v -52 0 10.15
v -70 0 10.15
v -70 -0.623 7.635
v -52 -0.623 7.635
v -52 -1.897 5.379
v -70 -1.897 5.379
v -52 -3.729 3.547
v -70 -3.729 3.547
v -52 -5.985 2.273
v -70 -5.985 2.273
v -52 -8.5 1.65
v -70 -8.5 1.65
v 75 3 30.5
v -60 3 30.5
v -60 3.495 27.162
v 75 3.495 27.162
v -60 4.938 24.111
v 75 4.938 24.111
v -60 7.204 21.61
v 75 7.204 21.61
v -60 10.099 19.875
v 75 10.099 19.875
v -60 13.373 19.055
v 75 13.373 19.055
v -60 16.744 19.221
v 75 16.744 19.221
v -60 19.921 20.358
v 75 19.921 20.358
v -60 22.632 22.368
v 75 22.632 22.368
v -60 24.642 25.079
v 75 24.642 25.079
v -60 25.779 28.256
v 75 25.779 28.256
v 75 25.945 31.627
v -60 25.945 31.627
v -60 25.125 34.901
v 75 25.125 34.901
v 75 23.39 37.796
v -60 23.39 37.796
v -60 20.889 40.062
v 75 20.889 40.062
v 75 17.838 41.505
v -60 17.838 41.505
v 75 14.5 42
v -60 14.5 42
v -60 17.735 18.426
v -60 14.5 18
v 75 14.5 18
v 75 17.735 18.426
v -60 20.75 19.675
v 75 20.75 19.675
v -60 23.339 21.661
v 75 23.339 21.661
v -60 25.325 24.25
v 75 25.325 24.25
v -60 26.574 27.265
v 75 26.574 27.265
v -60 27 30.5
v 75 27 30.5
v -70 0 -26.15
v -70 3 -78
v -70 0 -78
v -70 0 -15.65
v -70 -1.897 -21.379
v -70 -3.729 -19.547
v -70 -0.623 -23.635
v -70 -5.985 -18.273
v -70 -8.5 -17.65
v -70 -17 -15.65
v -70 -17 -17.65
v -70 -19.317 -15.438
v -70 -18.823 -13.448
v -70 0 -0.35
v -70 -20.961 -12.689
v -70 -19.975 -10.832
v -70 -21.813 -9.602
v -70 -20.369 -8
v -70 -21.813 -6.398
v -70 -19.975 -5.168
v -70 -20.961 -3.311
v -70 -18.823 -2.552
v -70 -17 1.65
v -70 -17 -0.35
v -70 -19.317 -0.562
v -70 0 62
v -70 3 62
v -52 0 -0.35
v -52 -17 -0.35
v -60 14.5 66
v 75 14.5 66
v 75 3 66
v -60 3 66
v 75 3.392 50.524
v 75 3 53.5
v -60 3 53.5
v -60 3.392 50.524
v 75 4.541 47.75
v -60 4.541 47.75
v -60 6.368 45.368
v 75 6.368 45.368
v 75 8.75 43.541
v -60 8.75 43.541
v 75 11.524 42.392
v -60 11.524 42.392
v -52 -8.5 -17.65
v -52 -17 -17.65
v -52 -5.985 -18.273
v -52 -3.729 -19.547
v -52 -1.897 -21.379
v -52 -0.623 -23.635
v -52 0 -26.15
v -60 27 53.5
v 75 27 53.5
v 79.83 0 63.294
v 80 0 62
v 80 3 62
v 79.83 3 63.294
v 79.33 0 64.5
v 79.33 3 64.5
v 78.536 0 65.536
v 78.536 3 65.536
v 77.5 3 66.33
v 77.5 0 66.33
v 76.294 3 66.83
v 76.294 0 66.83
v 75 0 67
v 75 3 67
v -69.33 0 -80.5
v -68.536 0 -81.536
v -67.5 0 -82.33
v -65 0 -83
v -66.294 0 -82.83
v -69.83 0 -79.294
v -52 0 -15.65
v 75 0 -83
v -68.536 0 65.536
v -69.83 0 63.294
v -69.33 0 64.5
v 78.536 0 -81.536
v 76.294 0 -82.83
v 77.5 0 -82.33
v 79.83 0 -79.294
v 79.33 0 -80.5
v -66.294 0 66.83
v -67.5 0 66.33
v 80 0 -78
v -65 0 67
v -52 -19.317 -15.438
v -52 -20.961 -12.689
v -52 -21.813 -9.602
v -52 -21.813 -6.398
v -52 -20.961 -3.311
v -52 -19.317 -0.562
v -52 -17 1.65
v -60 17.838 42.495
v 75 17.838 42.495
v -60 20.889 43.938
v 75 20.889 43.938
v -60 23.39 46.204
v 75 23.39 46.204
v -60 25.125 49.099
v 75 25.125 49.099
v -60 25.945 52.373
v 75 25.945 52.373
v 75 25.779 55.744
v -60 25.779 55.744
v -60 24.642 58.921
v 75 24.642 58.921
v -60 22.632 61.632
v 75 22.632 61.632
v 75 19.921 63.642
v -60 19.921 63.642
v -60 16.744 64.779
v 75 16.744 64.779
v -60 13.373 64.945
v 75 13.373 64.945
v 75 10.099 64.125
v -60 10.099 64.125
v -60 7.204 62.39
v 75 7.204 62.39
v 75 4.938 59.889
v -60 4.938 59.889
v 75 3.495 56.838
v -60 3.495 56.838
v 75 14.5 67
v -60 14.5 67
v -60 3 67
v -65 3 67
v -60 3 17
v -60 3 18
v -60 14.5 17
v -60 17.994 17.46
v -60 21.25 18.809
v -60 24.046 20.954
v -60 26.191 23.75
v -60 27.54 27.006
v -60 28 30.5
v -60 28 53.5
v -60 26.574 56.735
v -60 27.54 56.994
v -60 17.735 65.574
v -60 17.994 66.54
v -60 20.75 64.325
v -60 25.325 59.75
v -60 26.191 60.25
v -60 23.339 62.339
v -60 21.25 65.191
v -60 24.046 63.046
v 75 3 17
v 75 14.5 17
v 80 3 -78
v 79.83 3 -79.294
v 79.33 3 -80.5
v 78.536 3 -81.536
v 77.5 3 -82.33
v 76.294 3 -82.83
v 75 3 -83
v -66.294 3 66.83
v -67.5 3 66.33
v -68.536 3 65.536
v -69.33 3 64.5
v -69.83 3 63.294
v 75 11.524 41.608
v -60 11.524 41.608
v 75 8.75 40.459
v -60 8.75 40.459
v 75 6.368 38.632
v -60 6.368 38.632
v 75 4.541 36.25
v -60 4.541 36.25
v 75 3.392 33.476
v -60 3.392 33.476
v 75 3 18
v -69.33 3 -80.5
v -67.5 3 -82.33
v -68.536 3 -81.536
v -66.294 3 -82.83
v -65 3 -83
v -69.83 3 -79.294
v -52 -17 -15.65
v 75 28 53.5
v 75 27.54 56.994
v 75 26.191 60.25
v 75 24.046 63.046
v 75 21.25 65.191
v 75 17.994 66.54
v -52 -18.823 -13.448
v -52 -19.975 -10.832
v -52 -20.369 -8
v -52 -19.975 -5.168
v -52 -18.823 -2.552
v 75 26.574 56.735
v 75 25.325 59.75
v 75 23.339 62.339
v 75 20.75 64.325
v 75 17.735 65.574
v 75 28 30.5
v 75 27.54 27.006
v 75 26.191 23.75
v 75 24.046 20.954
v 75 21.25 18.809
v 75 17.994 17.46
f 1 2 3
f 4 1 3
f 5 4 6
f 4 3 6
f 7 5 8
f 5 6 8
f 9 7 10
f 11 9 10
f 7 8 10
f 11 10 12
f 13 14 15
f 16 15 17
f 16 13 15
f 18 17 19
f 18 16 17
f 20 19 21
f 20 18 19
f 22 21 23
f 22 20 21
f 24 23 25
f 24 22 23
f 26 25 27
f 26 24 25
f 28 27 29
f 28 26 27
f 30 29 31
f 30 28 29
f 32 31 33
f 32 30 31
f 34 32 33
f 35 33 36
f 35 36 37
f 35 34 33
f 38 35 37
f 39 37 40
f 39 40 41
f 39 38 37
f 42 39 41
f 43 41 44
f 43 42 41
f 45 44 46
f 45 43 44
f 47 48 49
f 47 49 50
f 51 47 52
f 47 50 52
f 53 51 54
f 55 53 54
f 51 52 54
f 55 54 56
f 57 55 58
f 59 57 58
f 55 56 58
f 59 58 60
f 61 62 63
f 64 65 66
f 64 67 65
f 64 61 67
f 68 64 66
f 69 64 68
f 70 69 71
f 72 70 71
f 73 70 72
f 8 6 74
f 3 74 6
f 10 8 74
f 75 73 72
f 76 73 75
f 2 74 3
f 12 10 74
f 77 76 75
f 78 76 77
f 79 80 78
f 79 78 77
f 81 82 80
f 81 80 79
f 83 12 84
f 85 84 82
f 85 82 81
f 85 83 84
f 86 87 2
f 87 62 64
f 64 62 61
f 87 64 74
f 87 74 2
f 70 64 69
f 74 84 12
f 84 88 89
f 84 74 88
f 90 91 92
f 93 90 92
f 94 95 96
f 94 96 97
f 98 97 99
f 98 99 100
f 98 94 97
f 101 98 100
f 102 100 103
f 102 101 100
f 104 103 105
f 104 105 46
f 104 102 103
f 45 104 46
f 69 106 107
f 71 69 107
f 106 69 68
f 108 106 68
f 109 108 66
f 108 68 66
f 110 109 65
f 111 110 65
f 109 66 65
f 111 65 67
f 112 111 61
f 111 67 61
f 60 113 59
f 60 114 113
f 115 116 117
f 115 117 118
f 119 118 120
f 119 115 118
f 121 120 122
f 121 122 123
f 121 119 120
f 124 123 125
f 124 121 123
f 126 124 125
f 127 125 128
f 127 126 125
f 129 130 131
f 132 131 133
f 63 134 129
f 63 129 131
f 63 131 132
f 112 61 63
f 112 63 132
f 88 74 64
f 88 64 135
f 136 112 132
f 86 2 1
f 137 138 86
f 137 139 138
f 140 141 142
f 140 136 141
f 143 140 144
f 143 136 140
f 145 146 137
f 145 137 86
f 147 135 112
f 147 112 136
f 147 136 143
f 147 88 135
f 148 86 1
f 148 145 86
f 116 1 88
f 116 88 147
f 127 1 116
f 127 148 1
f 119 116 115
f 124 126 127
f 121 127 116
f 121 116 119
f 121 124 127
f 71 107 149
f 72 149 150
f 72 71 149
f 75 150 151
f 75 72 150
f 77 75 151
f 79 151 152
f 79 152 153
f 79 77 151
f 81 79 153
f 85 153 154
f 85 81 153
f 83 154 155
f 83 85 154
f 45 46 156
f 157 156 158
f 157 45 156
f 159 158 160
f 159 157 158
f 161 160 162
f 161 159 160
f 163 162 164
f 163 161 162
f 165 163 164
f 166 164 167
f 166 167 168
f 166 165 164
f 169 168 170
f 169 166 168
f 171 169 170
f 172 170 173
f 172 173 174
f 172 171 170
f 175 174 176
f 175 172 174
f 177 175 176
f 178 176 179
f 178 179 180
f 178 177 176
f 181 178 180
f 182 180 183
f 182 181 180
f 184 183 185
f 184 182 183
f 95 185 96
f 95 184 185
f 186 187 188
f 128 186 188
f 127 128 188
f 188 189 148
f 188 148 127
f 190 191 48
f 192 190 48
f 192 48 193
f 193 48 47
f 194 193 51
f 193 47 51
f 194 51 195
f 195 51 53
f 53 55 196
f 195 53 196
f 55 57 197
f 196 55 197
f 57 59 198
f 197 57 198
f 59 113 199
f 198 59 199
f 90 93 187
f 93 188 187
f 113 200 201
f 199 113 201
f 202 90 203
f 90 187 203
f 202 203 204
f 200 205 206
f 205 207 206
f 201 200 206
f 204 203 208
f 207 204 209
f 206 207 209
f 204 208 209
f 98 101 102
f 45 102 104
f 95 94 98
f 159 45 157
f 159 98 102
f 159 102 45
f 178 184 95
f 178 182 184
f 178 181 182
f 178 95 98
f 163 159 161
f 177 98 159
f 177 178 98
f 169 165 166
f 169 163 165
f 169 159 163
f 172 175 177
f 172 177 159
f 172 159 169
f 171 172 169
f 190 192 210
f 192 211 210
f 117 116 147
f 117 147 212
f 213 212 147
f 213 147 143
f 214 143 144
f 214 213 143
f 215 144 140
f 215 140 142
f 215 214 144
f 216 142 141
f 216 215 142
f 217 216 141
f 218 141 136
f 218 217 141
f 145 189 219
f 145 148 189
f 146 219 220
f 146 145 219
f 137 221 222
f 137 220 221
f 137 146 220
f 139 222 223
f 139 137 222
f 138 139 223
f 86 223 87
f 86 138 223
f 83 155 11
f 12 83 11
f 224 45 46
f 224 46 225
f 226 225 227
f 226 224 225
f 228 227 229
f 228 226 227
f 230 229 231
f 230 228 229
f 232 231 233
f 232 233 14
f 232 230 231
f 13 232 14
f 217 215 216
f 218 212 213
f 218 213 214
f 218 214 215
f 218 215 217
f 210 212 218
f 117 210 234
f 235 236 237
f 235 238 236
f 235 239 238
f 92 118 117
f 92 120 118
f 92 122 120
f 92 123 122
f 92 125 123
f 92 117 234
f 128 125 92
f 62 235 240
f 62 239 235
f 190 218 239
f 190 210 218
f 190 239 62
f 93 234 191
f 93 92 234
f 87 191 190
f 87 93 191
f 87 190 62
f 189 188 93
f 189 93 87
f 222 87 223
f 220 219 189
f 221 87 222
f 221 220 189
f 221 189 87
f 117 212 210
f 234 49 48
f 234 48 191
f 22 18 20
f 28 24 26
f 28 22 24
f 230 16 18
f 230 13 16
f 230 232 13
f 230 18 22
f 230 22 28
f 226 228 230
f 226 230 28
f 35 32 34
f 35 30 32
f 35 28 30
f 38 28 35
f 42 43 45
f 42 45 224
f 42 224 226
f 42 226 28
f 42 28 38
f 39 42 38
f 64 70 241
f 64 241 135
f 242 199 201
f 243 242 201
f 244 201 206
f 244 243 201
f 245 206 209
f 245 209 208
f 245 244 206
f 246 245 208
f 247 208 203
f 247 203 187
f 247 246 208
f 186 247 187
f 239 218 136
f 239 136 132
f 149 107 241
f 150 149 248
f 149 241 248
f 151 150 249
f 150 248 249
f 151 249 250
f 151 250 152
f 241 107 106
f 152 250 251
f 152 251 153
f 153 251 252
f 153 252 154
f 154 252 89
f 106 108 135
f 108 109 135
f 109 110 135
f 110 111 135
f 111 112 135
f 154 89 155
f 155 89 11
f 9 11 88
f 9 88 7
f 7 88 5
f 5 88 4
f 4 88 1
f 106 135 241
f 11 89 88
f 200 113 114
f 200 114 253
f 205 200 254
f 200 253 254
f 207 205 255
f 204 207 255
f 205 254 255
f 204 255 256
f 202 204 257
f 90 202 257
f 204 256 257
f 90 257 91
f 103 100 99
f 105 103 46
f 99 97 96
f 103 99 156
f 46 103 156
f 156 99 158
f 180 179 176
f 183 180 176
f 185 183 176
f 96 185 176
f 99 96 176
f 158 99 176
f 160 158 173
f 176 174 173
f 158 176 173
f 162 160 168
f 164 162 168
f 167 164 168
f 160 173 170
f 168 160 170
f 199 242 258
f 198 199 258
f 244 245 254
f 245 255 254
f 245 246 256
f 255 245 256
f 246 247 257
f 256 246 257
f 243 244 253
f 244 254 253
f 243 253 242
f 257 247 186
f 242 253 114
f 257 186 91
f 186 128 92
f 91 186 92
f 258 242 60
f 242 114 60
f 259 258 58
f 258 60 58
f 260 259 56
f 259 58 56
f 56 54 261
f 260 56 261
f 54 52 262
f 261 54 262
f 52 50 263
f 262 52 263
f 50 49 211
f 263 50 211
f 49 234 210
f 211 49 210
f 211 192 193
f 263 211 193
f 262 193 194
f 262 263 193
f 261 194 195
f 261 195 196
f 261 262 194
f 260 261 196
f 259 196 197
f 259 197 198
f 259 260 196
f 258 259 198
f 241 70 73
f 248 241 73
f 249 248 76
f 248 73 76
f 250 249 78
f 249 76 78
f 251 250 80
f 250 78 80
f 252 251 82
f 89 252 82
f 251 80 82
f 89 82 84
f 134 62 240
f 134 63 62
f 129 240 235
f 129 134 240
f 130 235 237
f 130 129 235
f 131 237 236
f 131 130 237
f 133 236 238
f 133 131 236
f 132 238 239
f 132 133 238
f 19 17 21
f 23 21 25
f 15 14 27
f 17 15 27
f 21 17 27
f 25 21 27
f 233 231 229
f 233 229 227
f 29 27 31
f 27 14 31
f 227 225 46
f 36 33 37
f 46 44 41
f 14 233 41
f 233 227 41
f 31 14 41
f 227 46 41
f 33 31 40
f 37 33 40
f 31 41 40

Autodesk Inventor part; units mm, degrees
sketch "Sketch1" plane through (0, 0, 0) normal (0, 1, 0) x (-1, 0, 0)
  line L0 (0, 0) -> (75, 0)
  line L1 (0, 0) -> (-75, 0)
  line L2 (75, 0) -> (75, 75)
  line L3 (75, 75) -> (-75, 75)
  line L4 (-75, 75) -> (-75, 0)
  line L5 (-75, 0) -> (-75, -75)
  line L6 (-75, -75) -> (75, -75)
  line L7 (75, -69.5548) -> (75, 0)
  line L8 (75, -75) -> (75, -69.5548)
  line L9 (-75, 75) -> (-75, 65)
  dimension "d4" = 10
extrude "Extrusion1" add sketch "Sketch1" along normal blind 3
ref_plane "Work Plane1" through (75, 0, 0) normal (1, 0, 0) x (0, 1, 0)
sketch "Sketch3" plane through (75, 0, 0) normal (1, 0, 0) x (0, 1, 0)
  line L0 (3, 75) -> (3, 65)
  line L1 (3, 75) -> (3, -75) projected
  line L2 (3, 65) -> (3, 53.5)
  line L3 (3, 53.5) -> (14.5, 53.5)
  circle A0 centre (14.5, 53.5) radius 11.5
  line L4 (3, 53.5) -> (3, 30.5)
  line L5 (3, 30.5) -> (14.5, 30.5)
  circle A1 centre (14.5, 30.5) radius 11.5
  point P0 (0, 0)
  dimension "d12" = 10
  dimension "d13" = 11.5
  dimension "d14" = 11.5
  dimension "d15" = 23
extrude "Extrusion2" add sketch "Sketch3" against normal blind 135 contours A0 | A1
sketch "Sketch4" plane through (0, 3, 0) normal (0, 1, 0) x (1, 0, 0)
  point P0 (0, 0)
sketch "Sketch5" plane through (0, 3, 0) normal (0, 1, 0) x (1, 0, 0)
  point P0 (0, 0)
sketch "Sketch6" plane through (75, 0, 0) normal (1, 0, 0) x (0, 1, 0)
  arc A0 (14.5, 42) -> (3, 53.5) centre (14.5, 53.5) ccw projected
  line L0 (3, 75) -> (3, 53.5) projected
  arc A1 (3, 30.5) -> (14.5, 42) centre (14.5, 30.5) ccw projected
  line L1 (3, 30.5) -> (3, -75) projected
  line L2 (14.5, 66) -> (3, 66)
  line L3 (14.5, 18) -> (3, 18)
  arc A2 (27, 53.5) -> (14.5, 66) centre (14.5, 53.5) ccw
  line L4 (27, 53.5) -> (27, 30.5)
  arc A3 (14.5, 18) -> (27, 30.5) centre (14.5, 30.5) ccw
  line L5 (3, 66) -> (3, 67)
  line L6 (3, 67) -> (14.5, 67)
  arc A4 (28, 53.5) -> (14.5, 67) centre (14.5, 53.5) ccw
  line L7 (28, 53.5) -> (28, 30.5)
  arc A5 (14.5, 17) -> (28, 30.5) centre (14.5, 30.5) ccw
  line L8 (14.5, 17) -> (3, 17)
  line L9 (3, 67) -> (3, 66)
  line L10 (3, 18) -> (3, 17)
  point P0 (0, 0)
  dimension "d20" = 12.5
  dimension "d21" = 1
extrude "Extrusion3" add sketch "Sketch6" against normal blind 135 contours L0 L6 A4 L7 A5 L8 L1 L3 A3 L4 A2 L2
ref_plane "Work Plane2" through (-75, 0, 75) normal (0, 0, 1) x (1, 0, 0)
sketch "Sketch8" plane through (-75, 0, 75) normal (0, 0, 1) x (1, 0, 0)
  line L0 (0, 3) -> (150, 3)
  line L1 (150, 3) -> (150, 0)
  line L2 (150, 0) -> (0, 0)
  line L3 (0, 0) -> (0, 3)
  point P0 (75, 0)
extrude "Extrusion5" cut sketch "Sketch8" against normal blind 8
ref_plane "Work Plane3" through (-75, 0, -75) normal (-1, 0, 0) x (0, 0, 1)
sketch "Sketch9" plane through (-75, 0, -75) normal (-1, 0, 0) x (0, 0, 1)
  line L0 (0, 3.2367) -> (142, 3.2367)
  line L1 (142, 3.2367) -> (142, 0)
  line L2 (142, 0) -> (0, 0)
  line L3 (0, 0) -> (0, 3.2367)
  point P0 (75, 0)
extrude "Extrusion6" cut sketch "Sketch9" against normal blind 5
sketch "Sketch10" plane through (75, 0, 0) normal (1, 0, 0) x (0, 1, 0)
  line L0 (3, 67) -> (0, 67)
  line L1 (0, 67) -> (0, -82.8799)
  line L2 (0, -82.8799) -> (3, -82.8799)
  line L3 (3, -82.8799) -> (3, 67)
  point P0 (0, 0)
extrude "Extrusion7" add sketch "Sketch10" along normal blind 5
ref_plane "Work Plane4" through (75, 0, 0) normal (-1, 0, 0) x (0, 0, 1)
sketch "Sketch11" plane through (75, 0, 0) normal (-1, 0, 0) x (0, 0, 1)
  line L0 (-75, 3) -> (-82.8799, 3)
  line L1 (-82.8799, 3) -> (-82.8799, 0)
  line L2 (-82.8799, 0) -> (-75, 0)
  line L3 (-75, 0) -> (-75, 3)
  point P0 (0, 0)
extrude "Extrusion8" cut sketch "Sketch11" against normal blind 5
sketch "Sketch12" plane through (80, 3, -75) normal (0, 0, -1) x (-1, 0, 0)
  line L0 (0, 0) -> (150, 0)
  line L1 (150, 0) -> (150, -3)
  line L2 (150, -3) -> (0, -3)
  line L3 (0, -3) -> (0, 0)
  point P0 (80, -3)
extrude "Extrusion9" add sketch "Sketch12" along normal blind 8
fillet "Fillet1" radius 5 1 edges at (80, 1.5, 67)
fillet "Fillet2" radius 5 1 edges at (80, 1.5, -83)
fillet "Fillet3" radius 5 1 edges at (-70, 1.5, 67)
fillet "Fillet4" radius 5 1 edges at (-70, 1.5, -83)
sketch "Sketch13" plane through (0, 0, 0) normal (0, -1, 0) x (1, 0, 0)
  line L0 (80, 62) -> (80, -78)
  arc A0 (75, -83) -> (80, -78) centre (75, -78) ccw projected
  line L1 (80, -78) -> (80, -8)
  line L2 (80, -8) -> (-70, -8)
  line L3 (-70, 62) -> (-70, -78) projected
  line L4 (-70, -8) -> (-70, -78)
  line L5 (-70, -78) -> (-70, -8)
  line L6 (-70, 62) -> (-70, -8)
  line L7 (-70, -8) -> (5, -8)
  line L8 (5, -8) -> (5, 67)
  line L9 (75, 67) -> (-65, 67) projected
  line L10 (5, -8) -> (5, -83)
  point P0 (0, 0)
  dimension "d47" = 75
ref_plane "Work Plane5" through (-70, 0, -75) normal (-1, 0, 0) x (0, 0, 1)
sketch "Sketch14" plane through (-70, 0, -75) normal (-1, 0, 0) x (0, 0, 1)
  line L0 (137, 3) -> (-3, 3) projected
  line L1 (137, 0) -> (-3, 0) projected
  line L2 (67, 0) -> (67, 3)
  arc A0 (74.2639, 3) -> (75, 3) centre (74.6319, 3) ccw
  line L3 (67, 0) -> (59.35, 0)
  line L4 (67, 0) -> (74.65, 0)
  line L5 (74.65, 0) -> (74.65, -17)
  arc A1 (59.35, -17) -> (74.65, -17) centre (67, -10) ccw
  line L6 (74.65, -17) -> (74.65, 0)
  line L7 (59.35, -17) -> (59.35, 0)
  line L8 (59.35, 0) -> (74.65, 0)
  line L9 (74.65, -17) -> (74.65, 0)
  line L10 (59.1282, 0) -> (57.1283, 0)
  line L11 (59.35, 0) -> (57.35, 0)
  line L12 (57.35, -17) -> (59.35, -17)
  line L13 (74.65, 0) -> (76.65, 0)
  line L14 (76.65, -17) -> (74.65, -17)
  arc A2 (57.35, -17) -> (76.65, -17) centre (67, -10) ccw
  line L15 (74.65, 0) -> (74.65, -17)
  line L16 (76.65, 0) -> (85.15, 0)
  arc A3 (85.15, 0) -> (76.65, -8.5) centre (86.1766, -9.5266) ccw
  arc A4 (57.35, -8.5) -> (48.85, 0) centre (47.8234, -9.5266) ccw
  line L17 (57.35, -8.5) -> (57.35, -17)
  line L18 (76.65, -17) -> (76.65, -8.5)
  line L19 (48.85, 0) -> (59.35, 0)
  line L20 (74.65, 0) -> (85.15, 0)
  line L21 (74.65, 0) -> (74.65, -17)
  point P0 (75, 0)
  dimension "d49" = 7.65
  dimension "d50" = 7.65
  dimension "d52" = 17
  dimension "d53" = 2
  dimension "d54" = 2
  dimension "d55" = 8.5
extrude "Extrusion10" add sketch "Sketch14" against normal blind 18 contours A3 L18 L14 L5 L1 | A2 L12 A1 L14 | L17 A4 L1 L7 L12
